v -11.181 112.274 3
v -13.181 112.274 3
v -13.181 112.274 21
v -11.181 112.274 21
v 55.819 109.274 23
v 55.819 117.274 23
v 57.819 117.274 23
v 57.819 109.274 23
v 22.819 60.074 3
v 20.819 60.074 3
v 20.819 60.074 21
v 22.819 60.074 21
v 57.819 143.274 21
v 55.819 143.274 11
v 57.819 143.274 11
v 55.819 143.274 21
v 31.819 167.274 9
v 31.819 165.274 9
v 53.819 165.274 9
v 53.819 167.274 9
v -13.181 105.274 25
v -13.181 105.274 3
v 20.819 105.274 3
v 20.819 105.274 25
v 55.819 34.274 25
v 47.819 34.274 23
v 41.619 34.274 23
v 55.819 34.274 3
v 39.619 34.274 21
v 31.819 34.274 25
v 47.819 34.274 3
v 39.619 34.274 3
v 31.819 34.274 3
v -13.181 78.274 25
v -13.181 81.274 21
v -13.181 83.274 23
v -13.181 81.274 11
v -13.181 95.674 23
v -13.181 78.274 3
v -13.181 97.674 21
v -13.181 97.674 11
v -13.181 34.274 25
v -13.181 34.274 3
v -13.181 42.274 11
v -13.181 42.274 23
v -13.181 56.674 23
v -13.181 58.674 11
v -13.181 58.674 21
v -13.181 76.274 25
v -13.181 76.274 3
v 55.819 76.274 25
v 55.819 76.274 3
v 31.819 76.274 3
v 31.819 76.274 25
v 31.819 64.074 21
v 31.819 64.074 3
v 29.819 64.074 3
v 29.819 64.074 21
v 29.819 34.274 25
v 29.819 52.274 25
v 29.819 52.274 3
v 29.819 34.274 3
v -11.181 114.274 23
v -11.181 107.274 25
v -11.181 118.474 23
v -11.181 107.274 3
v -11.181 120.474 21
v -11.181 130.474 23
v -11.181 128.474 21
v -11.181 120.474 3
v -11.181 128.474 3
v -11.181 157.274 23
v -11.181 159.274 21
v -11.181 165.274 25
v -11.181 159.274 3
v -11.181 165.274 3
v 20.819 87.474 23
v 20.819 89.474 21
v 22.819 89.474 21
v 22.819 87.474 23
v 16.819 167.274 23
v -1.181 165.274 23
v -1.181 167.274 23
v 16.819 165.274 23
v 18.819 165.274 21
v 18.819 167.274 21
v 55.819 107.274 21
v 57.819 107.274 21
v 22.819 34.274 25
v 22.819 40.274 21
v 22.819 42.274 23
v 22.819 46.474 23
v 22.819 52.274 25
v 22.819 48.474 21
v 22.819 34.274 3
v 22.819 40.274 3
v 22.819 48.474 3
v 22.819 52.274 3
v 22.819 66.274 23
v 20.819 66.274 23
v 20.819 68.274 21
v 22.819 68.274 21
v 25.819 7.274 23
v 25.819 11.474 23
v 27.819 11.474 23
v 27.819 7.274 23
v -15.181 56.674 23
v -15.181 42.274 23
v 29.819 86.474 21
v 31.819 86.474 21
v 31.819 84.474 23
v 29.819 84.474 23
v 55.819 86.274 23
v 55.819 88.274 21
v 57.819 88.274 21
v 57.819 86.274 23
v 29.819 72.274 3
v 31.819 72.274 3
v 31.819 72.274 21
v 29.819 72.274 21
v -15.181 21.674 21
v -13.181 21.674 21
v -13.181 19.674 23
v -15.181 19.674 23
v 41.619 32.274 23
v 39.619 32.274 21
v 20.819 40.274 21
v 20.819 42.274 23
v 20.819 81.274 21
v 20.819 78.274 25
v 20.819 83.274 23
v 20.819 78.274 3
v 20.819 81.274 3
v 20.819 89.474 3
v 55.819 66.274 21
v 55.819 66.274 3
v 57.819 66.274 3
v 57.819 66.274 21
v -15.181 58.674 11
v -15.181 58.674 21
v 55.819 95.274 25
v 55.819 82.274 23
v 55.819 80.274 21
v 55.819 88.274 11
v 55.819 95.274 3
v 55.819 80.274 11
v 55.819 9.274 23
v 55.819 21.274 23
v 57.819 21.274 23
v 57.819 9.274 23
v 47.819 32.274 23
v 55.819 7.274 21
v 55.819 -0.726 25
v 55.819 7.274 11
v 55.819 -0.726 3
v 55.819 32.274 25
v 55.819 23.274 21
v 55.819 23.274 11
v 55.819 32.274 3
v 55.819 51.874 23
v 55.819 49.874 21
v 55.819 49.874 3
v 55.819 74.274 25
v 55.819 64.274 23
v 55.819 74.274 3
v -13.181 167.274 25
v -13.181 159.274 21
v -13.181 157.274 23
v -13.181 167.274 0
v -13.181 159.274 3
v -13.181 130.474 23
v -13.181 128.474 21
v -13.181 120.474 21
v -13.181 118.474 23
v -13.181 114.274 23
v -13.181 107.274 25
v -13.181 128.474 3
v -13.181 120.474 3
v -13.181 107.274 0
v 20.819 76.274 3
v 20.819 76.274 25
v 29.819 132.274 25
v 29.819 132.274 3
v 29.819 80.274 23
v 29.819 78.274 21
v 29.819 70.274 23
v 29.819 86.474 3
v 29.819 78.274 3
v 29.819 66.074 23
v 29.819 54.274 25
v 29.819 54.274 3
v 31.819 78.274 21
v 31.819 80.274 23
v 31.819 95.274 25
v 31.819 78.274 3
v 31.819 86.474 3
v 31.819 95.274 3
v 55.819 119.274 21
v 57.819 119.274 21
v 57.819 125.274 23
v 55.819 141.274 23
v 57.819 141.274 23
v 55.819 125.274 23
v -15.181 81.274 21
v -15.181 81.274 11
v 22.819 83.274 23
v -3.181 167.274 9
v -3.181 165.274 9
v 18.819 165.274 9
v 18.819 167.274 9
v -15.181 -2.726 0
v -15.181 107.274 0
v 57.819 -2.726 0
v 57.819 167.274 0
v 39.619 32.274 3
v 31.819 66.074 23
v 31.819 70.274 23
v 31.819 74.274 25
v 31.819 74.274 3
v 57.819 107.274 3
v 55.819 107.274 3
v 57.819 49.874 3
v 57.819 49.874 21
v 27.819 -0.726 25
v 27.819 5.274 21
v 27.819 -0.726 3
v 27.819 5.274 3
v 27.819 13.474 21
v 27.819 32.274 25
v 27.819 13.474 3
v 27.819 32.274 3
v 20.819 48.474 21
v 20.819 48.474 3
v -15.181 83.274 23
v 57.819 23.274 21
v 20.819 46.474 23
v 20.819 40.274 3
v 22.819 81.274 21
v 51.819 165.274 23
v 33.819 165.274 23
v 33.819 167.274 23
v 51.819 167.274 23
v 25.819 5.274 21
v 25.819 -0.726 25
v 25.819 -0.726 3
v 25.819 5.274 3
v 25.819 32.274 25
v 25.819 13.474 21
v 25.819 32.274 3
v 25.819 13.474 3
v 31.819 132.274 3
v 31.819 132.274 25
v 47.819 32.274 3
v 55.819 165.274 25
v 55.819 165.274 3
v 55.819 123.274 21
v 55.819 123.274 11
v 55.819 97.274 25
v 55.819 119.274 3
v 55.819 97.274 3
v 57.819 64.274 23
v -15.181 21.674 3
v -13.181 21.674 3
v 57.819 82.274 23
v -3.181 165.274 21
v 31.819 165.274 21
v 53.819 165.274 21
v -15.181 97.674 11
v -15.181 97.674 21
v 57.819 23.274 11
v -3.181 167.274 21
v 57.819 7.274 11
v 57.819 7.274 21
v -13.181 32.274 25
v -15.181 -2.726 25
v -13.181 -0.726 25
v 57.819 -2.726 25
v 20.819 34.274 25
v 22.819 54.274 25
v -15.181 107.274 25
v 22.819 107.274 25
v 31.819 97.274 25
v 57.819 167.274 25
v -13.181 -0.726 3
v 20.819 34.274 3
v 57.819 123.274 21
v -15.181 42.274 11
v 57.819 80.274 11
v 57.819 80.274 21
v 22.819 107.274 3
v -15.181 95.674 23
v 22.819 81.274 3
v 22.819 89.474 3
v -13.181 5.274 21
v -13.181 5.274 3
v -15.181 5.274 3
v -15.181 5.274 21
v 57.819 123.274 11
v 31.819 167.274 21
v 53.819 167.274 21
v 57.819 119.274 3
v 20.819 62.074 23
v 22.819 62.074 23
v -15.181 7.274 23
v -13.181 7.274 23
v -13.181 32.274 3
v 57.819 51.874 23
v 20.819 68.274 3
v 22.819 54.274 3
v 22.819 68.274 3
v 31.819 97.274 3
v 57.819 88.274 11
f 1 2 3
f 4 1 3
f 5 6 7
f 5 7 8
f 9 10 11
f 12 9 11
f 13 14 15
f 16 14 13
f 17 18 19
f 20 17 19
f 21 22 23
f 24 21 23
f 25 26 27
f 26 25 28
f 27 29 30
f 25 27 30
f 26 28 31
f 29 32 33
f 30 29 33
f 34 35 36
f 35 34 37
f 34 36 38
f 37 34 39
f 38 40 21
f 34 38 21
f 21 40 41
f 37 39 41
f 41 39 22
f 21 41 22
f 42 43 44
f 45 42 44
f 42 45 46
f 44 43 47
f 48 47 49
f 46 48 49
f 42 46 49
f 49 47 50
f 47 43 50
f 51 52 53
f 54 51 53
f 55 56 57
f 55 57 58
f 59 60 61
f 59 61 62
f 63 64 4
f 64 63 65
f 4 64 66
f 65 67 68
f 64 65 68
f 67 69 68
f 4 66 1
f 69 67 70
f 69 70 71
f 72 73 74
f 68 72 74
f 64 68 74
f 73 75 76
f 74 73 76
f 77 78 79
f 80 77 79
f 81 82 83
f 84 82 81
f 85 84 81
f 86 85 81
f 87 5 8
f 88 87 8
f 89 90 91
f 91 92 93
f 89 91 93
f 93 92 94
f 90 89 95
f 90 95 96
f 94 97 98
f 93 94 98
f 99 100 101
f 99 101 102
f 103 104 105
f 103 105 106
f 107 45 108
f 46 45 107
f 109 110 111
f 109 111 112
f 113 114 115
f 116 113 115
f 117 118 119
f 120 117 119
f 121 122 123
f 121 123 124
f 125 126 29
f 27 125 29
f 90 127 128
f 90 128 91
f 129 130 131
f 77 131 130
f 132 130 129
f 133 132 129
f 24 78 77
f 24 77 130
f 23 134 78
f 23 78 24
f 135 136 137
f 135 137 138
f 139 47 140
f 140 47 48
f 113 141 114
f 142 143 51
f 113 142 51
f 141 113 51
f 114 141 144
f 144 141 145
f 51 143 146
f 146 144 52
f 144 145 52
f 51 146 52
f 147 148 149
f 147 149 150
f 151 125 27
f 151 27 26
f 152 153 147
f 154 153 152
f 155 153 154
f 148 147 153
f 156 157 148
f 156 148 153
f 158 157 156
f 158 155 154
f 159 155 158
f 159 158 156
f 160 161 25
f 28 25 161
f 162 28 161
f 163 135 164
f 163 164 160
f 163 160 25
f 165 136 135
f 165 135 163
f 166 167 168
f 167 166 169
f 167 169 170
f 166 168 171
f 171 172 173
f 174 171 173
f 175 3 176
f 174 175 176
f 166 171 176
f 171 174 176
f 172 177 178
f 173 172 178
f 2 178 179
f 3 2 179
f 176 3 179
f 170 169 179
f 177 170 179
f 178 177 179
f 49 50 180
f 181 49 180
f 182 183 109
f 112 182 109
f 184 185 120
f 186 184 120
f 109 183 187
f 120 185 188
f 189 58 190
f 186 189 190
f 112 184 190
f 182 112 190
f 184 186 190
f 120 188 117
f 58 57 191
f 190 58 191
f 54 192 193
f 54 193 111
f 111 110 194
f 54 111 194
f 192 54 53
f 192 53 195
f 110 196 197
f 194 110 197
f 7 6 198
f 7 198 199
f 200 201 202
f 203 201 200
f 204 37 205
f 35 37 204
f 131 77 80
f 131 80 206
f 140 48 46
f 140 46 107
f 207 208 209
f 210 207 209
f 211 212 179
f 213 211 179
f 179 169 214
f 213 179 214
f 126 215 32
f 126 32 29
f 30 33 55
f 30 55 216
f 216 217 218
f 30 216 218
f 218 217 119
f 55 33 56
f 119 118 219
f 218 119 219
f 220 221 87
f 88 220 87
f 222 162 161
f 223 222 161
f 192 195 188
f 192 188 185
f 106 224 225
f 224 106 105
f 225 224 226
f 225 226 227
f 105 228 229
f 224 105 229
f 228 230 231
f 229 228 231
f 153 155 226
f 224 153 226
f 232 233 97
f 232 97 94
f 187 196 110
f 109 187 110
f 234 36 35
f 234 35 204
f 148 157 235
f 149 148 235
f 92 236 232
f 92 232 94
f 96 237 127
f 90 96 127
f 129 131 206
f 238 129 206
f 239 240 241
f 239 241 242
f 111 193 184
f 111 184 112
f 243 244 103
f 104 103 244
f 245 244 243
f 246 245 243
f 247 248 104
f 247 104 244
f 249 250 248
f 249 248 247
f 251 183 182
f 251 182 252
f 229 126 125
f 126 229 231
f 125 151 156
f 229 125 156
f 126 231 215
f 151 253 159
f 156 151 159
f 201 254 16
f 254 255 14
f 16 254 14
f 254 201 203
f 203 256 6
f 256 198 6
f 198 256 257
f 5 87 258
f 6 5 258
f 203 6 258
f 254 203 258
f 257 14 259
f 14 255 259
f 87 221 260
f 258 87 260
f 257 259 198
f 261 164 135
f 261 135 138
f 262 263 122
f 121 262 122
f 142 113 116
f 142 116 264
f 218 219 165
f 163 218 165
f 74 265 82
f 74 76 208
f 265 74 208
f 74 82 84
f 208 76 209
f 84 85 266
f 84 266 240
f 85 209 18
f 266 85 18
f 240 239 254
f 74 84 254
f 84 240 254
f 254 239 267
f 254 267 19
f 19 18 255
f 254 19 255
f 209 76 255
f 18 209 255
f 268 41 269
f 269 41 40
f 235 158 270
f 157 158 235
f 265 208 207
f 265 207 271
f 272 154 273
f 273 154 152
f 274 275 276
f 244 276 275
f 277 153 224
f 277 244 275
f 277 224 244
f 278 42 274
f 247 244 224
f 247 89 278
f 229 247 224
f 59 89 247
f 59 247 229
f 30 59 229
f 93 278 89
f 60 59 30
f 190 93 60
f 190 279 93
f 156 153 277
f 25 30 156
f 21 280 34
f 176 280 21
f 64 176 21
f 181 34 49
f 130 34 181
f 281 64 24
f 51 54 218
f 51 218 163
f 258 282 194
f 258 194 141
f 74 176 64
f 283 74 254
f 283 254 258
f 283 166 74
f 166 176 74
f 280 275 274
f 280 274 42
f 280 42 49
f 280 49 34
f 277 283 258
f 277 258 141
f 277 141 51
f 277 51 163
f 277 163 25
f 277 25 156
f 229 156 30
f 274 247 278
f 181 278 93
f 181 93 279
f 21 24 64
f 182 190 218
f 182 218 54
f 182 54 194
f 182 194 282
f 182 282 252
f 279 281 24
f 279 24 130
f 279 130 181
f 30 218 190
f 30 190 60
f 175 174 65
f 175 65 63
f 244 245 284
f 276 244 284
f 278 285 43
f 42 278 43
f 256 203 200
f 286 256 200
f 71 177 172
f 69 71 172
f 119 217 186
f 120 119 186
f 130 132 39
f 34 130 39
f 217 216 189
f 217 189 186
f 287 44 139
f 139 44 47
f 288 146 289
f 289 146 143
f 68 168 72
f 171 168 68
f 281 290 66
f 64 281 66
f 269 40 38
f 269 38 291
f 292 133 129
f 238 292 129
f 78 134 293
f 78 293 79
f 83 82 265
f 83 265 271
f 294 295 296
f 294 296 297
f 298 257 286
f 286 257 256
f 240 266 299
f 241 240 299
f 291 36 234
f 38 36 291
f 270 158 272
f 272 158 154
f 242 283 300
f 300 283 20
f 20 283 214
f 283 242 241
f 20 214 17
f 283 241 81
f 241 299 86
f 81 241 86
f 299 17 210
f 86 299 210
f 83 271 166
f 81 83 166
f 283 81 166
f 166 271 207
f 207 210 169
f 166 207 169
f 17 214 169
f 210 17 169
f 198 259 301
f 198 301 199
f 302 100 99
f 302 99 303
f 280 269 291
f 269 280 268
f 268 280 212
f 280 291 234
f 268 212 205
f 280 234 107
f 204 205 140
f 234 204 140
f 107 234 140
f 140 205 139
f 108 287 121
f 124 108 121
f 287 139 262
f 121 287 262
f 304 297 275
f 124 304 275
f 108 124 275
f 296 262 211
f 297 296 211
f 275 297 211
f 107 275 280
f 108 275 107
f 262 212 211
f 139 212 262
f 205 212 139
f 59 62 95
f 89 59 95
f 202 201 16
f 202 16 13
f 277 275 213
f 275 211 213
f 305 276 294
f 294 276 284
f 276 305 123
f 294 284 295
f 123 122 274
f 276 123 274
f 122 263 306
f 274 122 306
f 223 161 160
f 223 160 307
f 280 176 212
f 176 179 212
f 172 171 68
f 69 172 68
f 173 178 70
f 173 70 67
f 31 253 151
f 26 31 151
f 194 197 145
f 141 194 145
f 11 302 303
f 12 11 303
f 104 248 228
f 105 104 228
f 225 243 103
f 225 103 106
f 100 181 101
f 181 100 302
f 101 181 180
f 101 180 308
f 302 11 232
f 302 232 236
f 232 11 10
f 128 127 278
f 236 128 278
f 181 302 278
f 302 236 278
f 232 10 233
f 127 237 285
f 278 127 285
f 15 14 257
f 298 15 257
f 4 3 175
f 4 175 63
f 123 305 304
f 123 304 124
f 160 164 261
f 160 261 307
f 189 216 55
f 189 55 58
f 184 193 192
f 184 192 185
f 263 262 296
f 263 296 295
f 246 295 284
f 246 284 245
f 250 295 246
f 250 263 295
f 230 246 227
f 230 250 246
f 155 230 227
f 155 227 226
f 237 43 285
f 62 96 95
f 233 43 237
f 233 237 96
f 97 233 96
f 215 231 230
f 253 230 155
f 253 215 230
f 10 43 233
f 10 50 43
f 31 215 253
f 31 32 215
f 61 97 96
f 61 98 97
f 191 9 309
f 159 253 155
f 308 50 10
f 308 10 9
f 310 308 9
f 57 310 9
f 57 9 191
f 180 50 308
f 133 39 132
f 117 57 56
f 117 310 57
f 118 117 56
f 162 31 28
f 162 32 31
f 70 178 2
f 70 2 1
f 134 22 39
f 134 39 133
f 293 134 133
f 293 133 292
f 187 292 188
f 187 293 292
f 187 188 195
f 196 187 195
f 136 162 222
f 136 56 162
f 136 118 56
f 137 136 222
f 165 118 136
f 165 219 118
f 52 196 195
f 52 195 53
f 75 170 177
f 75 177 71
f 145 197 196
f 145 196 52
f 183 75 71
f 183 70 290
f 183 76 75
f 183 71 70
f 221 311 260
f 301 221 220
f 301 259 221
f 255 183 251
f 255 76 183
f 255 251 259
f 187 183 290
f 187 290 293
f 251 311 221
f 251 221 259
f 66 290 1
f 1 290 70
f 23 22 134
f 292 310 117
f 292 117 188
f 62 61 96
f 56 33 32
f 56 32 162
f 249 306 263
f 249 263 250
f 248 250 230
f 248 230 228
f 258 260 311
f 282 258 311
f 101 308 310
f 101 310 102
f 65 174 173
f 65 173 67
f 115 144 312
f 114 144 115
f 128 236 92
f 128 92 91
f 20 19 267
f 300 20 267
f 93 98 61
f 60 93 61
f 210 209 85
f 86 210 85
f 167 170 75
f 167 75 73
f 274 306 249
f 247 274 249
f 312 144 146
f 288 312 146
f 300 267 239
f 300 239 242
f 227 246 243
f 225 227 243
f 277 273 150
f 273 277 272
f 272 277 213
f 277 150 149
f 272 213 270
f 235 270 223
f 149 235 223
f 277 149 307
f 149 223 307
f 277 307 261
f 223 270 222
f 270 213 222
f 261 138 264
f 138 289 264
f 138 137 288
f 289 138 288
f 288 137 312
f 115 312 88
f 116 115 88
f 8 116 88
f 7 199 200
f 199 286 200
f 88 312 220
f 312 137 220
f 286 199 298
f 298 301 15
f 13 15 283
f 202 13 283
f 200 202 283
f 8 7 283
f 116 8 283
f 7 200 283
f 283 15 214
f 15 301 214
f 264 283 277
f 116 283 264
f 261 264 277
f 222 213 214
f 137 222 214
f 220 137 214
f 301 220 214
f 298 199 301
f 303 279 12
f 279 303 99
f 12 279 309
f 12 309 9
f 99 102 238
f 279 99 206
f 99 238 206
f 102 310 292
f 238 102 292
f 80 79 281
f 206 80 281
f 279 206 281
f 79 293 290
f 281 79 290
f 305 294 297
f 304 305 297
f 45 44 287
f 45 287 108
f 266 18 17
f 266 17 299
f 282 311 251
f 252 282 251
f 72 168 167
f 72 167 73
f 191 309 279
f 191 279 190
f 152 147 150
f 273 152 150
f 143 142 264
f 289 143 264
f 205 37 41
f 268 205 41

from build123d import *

# Parameters (mm, degrees)
F3_W      = 2
F3_H      = 110
F4_DEPTH  = 3
F5_W      = 2
F5_H      = 33
F5_H_2    = 40
F5_H_3    = 27
F5_H_4    = 19
F5_H_5    = 35
F5_W_2    = 7
F5_H_6    = 2
F6_DEPTH  = 22
F7_W      = 8.2
F7_H      = 20
F7_W_2    = 30.8
F8_DEPTH  = 2
F9_W      = 12
F9_H      = 20
F9_W_2    = 20
F9_H_2    = 12
F9_W_3    = 8
F9_W_4    = 16.4
F9_W_5    = 16
F10_DEPTH = 2
F11_W     = 22
F11_H     = 14
F12_DEPTH = 2
F13_W     = 8.2
F13_H     = 20
F14_DEPTH = 2
F15_W     = 8.2
F15_H     = 20
F16_DEPTH = 2
F17_W     = 8.2
F17_H     = 20
F18_DEPTH = 2
F19_W     = 8.2
F19_H     = 20
F20_DEPTH = 2
F21_W     = 16.4
F21_H     = 20
F21_H_2   = 12
F22_DEPTH = 2
F23_SIZE  = 2


with BuildPart() as f4:
    # F3 (on Top) → F4 (new body)
    with BuildSketch(Plane.XY):
        Polygon((57.8188975325, 167.2736013268), (-13.1811024675, 167.2736013268), (-13.1811024675, 107.2736013268), (-13.1811024675, -2.7263986732), (57.8188975325, -2.7263986732), align=None)
        with Locations((-14.1811024675, 52.2736013268)):
            Rectangle(F3_W, F3_H)
    extrude(amount=F4_DEPTH)

    # F5 (on face) → F6 (join)
    with BuildSketch(Plane.XY.offset(3)):
        with Locations((56.8188975325, 15.7736013268)):
            Rectangle(F5_W, F5_H)
        with Locations((56.8188975325, 54.2736013268)):
            Rectangle(F5_W, F5_H_2)
        Polygon((-13.1811024675, 167.2736013268), (-13.1811024675, 107.2736013268), (-11.1811024675, 107.2736013268), (-11.1811024675, 165.2736013268), (-11.1811024675, 167.2736013268), align=None)
        Polygon((-11.1811024675, 167.2736013268), (-11.1811024675, 165.2736013268), (55.8188975325, 165.2736013268), (57.8188975325, 165.2736013268), (57.8188975325, 167.2736013268), align=None)
        Polygon((-15.1811024675, -0.7263986732), (-15.1811024675, -2.7263986732), (57.8188975325, -2.7263986732), (57.8188975325, -0.7263986732), (55.8188975325, -0.7263986732), (27.8188975325, -0.7263986732), (25.8188975325, -0.7263986732), (-13.1811024675, -0.7263986732), align=None)
        Polygon((-11.1811024675, 107.2736013268), (-13.1811024675, 107.2736013268), (-13.1811024675, 105.2736013268), (20.8188975325, 105.2736013268), (22.8188975325, 105.2736013268), (22.8188975325, 107.2736013268), align=None)
        Polygon((55.8188975325, 76.2736013268), (57.8188975325, 76.2736013268), (57.8188975325, 165.2736013268), (55.8188975325, 165.2736013268), (55.8188975325, 97.2736013268), (55.8188975325, 95.2736013268), align=None)
        Polygon((-15.1811024675, 107.2736013268), (-15.1811024675, -0.7263986732), (-13.1811024675, -0.7263986732), (-13.1811024675, 32.2736013268), (-13.1811024675, 34.2736013268), (-13.1811024675, 76.2736013268), (-13.1811024675, 78.2736013268), (-13.1811024675, 105.2736013268), (-13.1811024675, 107.2736013268), align=None)
        Polygon((55.8188975325, 74.2736013268), (57.8188975325, 74.2736013268), (57.8188975325, 76.2736013268), (55.8188975325, 76.2736013268), (31.8188975325, 76.2736013268), (29.8188975325, 76.2736013268), (29.8188975325, 74.2736013268), (31.8188975325, 74.2736013268), align=None)
        Polygon((55.8188975325, 32.2736013268), (57.8188975325, 32.2736013268), (57.8188975325, 34.2736013268), (55.8188975325, 34.2736013268), (31.8188975325, 34.2736013268), (29.8188975325, 34.2736013268), (22.8188975325, 34.2736013268), (20.8188975325, 34.2736013268), (-13.1811024675, 34.2736013268), (-13.1811024675, 32.2736013268), (25.8188975325, 32.2736013268), (27.8188975325, 32.2736013268), align=None)
        with Locations((21.8188975325, 91.7736013268)):
            Rectangle(F5_W, F5_H_3)
        Polygon((20.8188975325, 76.2736013268), (20.8188975325, 34.2736013268), (22.8188975325, 34.2736013268), (22.8188975325, 52.2736013268), (22.8188975325, 54.2736013268), (22.8188975325, 76.2736013268), align=None)
        Polygon((-13.1811024675, 78.2736013268), (-13.1811024675, 76.2736013268), (20.8188975325, 76.2736013268), (22.8188975325, 76.2736013268), (22.8188975325, 78.2736013268), (20.8188975325, 78.2736013268), align=None)
        with Locations((30.8188975325, 85.7736013268)):
            Rectangle(F5_W, F5_H_4)
        Polygon((55.8188975325, 95.2736013268), (55.8188975325, 97.2736013268), (31.8188975325, 97.2736013268), (29.8188975325, 97.2736013268), (29.8188975325, 95.2736013268), (31.8188975325, 95.2736013268), align=None)
        with Locations((30.8188975325, 114.7736013268)):
            Rectangle(F5_W, F5_H_5)
        Polygon((29.8188975325, 34.2736013268), (31.8188975325, 34.2736013268), (31.8188975325, 74.2736013268), (29.8188975325, 74.2736013268), (29.8188975325, 54.2736013268), (29.8188975325, 52.2736013268), align=None)
        with Locations((26.3188975325, 53.2736013268)):
            Rectangle(F5_W_2, F5_H_6)
        with Locations((26.8188975325, 15.7736013268)):
            Rectangle(F5_W, F5_H)
    extrude(amount=F6_DEPTH)

    # F7 (on face) → F8 (cut)
    with BuildSketch(Plane(origin=(-13.1811024675, 0, 0), x_dir=(0, -1, 0), z_dir=(-1, 0, 0))):
        with Locations((-116.3736013268, 13)):
            Rectangle(F7_W, F7_H)
        with Locations((-143.8736013268, 13)):
            Rectangle(F7_W_2, F7_H)
    extrude(amount=-F8_DEPTH, mode=Mode.SUBTRACT)

    # F9 (on face) → F10 (cut)
    with BuildSketch(Plane(origin=(55.8188975325, 0, 0), x_dir=(0, -1, 0), z_dir=(-1, 0, 0))):
        with Locations((-113.2736013268, 13)):
            Rectangle(F9_W, F9_H)
        with Locations((-133.2736013268, 17)):
            Rectangle(F9_W_2, F9_H_2)
        with Locations((-84.2736013268, 17)):
            Rectangle(F9_W_3, F9_H_2)
        with Locations((-58.0736013268, 13)):
            Rectangle(F9_W_4, F9_H)
        with Locations((-15.2736013268, 17)):
            Rectangle(F9_W_5, F9_H_2)
    extrude(amount=-F10_DEPTH, mode=Mode.SUBTRACT)

    # F11 (on face) → F12 (cut)
    with BuildSketch(Plane.XZ.offset(-165.2736013268)):
        with Locations((42.8188975325, 16)):
            Rectangle(F11_W, F11_H)
        with Locations((7.8188975325, 16)):
            Rectangle(F11_W, F11_H)
    extrude(amount=-F12_DEPTH, mode=Mode.SUBTRACT)

    # F13 (on face) → F14 (cut)
    with BuildSketch(Plane(origin=(20.8188975325, 0, 0), x_dir=(0, -1, 0), z_dir=(-1, 0, 0))):
        with Locations((-85.3736013268, 13)):
            Rectangle(F13_W, F13_H)
        with Locations((-64.1736013268, 13)):
            Rectangle(F13_W, F13_H)
        with Locations((-44.3736013268, 13)):
            Rectangle(F13_W, F13_H)
    extrude(amount=-F14_DEPTH, mode=Mode.SUBTRACT)

    # F15 (on face) → F16 (cut)
    with BuildSketch(Plane.YZ.offset(31.8188975325)):
        with Locations((82.3736013268, 13)):
            Rectangle(F15_W, F15_H)
        with Locations((68.1736013268, 13)):
            Rectangle(F15_W, F15_H)
    extrude(amount=-F16_DEPTH, mode=Mode.SUBTRACT)

    # F17 (on face) → F18 (cut)
    with BuildSketch(Plane.XZ.offset(-32.2736013268)):
        with Locations((43.7188975325, 13)):
            Rectangle(F17_W, F17_H)
    extrude(amount=-F18_DEPTH, mode=Mode.SUBTRACT)

    # F19 (on face) → F20 (cut)
    with BuildSketch(Plane(origin=(25.8188975325, 0, 0), x_dir=(0, -1, 0), z_dir=(-1, 0, 0))):
        with Locations((-9.3736013268, 13)):
            Rectangle(F19_W, F19_H)
    extrude(amount=-F20_DEPTH, mode=Mode.SUBTRACT)

    # F21 (on face) → F22 (cut)
    with BuildSketch(Plane.YZ.offset(-13.1811024675)):
        with Locations((13.4736013268, 13)):
            Rectangle(F21_W, F21_H)
        with Locations((50.4736013268, 17)):
            Rectangle(F21_W, F21_H_2)
        with Locations((89.4736013268, 17)):
            Rectangle(F21_W, F21_H_2)
    extrude(amount=-F22_DEPTH, mode=Mode.SUBTRACT)

    # F23
    f23_edges = [f4.edges().sort_by_distance(p)[0] for p in [
        (-12.181102, 159.273601, 23),
        (-12.181102, 128.473601, 23),
        (-12.181102, 112.273601, 23),
        (-14.181102, 81.273601, 23),
        (18.818898, 166.273601, 23),
        (-14.181102, 21.673601, 23),
        (-14.181102, 58.673601, 23),
        (-14.181102, 97.673601, 23),
        (-12.181102, 120.473601, 23),
        (-14.181102, 5.273601, 23),
        (56.818898, 7.273601, 23),
        (26.818898, 5.273601, 23),
        (56.818898, 49.873601, 23),
        (56.818898, 80.273601, 23),
        (56.818898, 23.273601, 23),
        (56.818898, 66.273601, 23),
        (56.818898, 88.273601, 23),
        (39.618898, 33.273601, 23),
        (30.818898, 72.273601, 23),
        (21.818898, 68.273601, 23),
        (26.818898, 13.473601, 23),
        (31.818898, 166.273601, 23),
        (56.818898, 123.273601, 23),
        (56.818898, 107.273601, 23),
        (56.818898, 119.273601, 23),
        (56.818898, 143.273601, 23),
        (53.818898, 166.273601, 23),
        (-3.181102, 166.273601, 23),
        (30.818898, 78.273601, 23),
        (30.818898, 86.473601, 23),
        (30.818898, 64.073601, 23),
        (21.818898, 89.473601, 23),
        (21.818898, 81.273601, 23),
        (21.818898, 40.273601, 23),
        (21.818898, 48.473601, 23),
        (21.818898, 60.073601, 23),
    ]]
    chamfer(f23_edges, length=F23_SIZE)


solid = f4.part
